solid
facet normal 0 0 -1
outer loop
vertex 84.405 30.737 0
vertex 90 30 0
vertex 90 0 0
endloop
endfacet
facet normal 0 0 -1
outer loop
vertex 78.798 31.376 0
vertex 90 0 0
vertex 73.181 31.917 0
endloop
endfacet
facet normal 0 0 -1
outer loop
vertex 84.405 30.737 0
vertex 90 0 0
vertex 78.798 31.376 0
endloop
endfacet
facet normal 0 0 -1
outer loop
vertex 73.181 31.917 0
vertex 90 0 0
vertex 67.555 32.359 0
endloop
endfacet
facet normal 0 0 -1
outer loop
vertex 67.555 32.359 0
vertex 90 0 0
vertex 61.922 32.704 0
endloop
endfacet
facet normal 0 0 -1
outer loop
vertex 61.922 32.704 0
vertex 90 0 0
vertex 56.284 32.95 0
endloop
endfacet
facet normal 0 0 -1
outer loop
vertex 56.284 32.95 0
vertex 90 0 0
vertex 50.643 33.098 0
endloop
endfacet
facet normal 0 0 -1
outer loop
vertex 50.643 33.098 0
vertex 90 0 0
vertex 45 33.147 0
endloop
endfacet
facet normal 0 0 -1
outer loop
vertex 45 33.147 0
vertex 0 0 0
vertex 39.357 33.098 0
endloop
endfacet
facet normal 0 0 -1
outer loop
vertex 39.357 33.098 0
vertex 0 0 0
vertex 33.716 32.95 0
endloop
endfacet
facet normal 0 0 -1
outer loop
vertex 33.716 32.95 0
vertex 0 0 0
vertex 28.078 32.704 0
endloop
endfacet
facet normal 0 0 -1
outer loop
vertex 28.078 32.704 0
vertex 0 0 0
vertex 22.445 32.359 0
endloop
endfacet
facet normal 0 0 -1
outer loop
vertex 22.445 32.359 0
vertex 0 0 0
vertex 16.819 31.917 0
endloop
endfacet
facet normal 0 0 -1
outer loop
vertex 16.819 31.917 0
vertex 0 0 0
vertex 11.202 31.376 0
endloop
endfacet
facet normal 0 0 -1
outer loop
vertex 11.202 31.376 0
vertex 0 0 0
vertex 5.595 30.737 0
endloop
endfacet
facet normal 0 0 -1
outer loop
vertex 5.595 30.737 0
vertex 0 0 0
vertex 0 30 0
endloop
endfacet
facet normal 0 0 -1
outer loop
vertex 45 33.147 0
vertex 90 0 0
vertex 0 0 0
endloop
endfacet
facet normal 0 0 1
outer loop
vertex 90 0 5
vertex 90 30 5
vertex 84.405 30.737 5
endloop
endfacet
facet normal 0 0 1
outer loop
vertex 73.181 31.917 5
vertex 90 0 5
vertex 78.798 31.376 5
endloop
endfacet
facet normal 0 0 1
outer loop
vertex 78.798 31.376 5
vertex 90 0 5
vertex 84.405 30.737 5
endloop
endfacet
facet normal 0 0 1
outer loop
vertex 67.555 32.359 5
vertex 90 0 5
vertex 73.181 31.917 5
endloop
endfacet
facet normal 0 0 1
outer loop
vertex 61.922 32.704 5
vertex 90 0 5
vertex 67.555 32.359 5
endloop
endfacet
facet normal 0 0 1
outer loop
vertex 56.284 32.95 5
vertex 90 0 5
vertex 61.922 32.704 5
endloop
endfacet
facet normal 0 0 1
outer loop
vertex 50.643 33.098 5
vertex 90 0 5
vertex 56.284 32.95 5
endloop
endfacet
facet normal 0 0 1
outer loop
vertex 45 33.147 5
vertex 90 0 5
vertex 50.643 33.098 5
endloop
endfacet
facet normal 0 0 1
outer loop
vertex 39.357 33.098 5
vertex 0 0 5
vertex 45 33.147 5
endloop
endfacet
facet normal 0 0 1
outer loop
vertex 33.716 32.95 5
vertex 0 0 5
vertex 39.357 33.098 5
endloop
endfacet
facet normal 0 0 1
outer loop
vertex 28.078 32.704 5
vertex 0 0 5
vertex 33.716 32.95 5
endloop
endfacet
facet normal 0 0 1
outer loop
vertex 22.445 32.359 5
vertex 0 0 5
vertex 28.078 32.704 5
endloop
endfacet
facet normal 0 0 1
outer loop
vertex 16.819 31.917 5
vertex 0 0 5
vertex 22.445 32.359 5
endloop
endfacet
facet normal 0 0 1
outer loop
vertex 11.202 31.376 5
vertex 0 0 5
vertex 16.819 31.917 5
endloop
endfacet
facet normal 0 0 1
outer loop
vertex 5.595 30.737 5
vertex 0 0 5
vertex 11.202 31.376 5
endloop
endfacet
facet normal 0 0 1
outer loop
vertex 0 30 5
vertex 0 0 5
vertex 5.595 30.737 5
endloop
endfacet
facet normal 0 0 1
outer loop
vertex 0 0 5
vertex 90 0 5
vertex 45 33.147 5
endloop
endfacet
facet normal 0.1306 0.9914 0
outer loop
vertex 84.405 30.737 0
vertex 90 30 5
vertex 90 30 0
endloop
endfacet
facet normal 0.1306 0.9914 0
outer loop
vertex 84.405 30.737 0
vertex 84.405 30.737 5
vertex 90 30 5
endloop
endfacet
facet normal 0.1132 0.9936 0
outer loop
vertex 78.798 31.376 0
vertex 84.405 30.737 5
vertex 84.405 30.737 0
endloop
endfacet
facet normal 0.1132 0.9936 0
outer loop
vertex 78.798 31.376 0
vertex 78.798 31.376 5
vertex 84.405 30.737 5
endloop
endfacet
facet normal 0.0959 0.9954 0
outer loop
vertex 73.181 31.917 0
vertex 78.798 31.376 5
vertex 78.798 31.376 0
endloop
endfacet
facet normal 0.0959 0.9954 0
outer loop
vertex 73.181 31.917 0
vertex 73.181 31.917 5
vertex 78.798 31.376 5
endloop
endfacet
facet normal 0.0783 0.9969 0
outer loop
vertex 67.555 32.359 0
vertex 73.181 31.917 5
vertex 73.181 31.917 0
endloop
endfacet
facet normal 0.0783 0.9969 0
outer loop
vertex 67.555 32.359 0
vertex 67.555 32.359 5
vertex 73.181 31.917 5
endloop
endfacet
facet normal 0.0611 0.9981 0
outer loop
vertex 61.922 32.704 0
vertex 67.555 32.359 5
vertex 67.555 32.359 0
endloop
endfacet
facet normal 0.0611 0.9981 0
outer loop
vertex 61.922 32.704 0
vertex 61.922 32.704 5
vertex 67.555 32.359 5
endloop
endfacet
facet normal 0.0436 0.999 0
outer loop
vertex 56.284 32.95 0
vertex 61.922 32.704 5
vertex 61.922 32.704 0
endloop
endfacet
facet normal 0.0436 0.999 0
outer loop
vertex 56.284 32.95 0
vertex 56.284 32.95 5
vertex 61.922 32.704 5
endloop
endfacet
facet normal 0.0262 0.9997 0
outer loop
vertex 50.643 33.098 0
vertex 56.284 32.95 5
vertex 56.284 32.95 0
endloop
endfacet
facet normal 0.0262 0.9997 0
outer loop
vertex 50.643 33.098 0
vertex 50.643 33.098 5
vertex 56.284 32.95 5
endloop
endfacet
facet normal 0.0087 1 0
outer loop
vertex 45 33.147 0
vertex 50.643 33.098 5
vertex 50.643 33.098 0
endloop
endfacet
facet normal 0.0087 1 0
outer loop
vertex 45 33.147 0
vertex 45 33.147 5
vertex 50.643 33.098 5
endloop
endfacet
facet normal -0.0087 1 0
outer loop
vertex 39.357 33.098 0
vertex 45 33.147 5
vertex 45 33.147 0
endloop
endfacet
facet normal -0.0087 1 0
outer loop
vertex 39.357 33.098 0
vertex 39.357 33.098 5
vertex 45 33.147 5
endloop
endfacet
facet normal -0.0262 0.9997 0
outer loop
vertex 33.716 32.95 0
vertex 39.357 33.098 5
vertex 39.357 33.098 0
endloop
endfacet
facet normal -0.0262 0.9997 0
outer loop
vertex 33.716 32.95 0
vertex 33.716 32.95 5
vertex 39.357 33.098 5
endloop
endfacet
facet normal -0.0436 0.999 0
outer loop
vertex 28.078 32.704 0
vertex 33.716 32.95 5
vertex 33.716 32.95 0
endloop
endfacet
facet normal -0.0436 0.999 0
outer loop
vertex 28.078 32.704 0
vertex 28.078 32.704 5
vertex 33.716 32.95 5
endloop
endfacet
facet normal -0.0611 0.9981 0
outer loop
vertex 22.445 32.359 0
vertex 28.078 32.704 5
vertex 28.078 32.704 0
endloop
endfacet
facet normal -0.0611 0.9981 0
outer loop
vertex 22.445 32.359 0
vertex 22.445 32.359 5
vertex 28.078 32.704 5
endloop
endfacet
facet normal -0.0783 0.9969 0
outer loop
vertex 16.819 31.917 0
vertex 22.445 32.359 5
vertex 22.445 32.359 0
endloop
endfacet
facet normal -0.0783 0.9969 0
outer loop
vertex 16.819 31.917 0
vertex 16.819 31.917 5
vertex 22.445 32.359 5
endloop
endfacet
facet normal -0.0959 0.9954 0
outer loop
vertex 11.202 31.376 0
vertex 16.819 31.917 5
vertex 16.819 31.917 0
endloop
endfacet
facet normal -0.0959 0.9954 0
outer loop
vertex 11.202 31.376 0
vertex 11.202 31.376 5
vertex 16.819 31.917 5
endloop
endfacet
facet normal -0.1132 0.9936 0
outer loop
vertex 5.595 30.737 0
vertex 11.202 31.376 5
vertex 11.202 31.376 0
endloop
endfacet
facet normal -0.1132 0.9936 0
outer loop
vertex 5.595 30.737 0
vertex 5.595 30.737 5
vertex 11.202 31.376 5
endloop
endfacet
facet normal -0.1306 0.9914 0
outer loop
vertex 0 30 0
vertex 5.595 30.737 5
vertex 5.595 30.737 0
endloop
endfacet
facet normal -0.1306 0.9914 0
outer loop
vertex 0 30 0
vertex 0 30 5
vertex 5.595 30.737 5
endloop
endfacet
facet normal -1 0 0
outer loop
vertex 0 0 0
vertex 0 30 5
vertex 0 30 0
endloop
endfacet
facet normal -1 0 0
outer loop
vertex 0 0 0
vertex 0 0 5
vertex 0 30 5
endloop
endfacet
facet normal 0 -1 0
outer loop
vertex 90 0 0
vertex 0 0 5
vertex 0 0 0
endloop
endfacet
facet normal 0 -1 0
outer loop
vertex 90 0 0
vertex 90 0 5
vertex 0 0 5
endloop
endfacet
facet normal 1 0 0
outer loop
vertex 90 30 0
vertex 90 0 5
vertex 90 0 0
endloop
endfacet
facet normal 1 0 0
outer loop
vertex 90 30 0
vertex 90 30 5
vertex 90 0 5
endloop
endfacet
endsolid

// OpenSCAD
$fn = 32;

// ----------------------------------------------------------------------
// Arc profile plate: crown, 19 points
// ----------------------------------------------------------------------

// --- parameters (mm) ---
bar_l = 90;               // bar length, X
bar_w = 30;               // bar height at the ends, Y
arc_r = 323.34;           // radius of the crown arc
arc_angle = 16;           // crown arc angle, degrees
crown_rise = 3.15;        // rise of the crown over the ends
arc_step = 1;             // sampling step of the crown arc, degrees
plate_t = 5;              // plate thickness, Z
fit_tol = 0.1;            // declared fit tolerance (prompt contract)
free_tol = 0.5;           // declared free tolerance (prompt contract)

bbox_y = bar_w + crown_rise;  // full height with the crown

profile = [[90, 30], [84.405, 30.737], [78.798, 31.376], [73.181, 31.917], [67.555, 32.359], [61.922, 32.704], [56.284, 32.95], [50.643, 33.098], [45, 33.147], [39.357, 33.098], [33.716, 32.95], [28.078, 32.704], [22.445, 32.359], [16.819, 31.917], [11.202, 31.376], [5.595, 30.737], [0, 30], [0, 0], [90, 0]];  // primary outline, 19 points, counter clockwise

// --- the one profile operation ---
linear_extrude(height = plate_t) polygon(points = profile);
